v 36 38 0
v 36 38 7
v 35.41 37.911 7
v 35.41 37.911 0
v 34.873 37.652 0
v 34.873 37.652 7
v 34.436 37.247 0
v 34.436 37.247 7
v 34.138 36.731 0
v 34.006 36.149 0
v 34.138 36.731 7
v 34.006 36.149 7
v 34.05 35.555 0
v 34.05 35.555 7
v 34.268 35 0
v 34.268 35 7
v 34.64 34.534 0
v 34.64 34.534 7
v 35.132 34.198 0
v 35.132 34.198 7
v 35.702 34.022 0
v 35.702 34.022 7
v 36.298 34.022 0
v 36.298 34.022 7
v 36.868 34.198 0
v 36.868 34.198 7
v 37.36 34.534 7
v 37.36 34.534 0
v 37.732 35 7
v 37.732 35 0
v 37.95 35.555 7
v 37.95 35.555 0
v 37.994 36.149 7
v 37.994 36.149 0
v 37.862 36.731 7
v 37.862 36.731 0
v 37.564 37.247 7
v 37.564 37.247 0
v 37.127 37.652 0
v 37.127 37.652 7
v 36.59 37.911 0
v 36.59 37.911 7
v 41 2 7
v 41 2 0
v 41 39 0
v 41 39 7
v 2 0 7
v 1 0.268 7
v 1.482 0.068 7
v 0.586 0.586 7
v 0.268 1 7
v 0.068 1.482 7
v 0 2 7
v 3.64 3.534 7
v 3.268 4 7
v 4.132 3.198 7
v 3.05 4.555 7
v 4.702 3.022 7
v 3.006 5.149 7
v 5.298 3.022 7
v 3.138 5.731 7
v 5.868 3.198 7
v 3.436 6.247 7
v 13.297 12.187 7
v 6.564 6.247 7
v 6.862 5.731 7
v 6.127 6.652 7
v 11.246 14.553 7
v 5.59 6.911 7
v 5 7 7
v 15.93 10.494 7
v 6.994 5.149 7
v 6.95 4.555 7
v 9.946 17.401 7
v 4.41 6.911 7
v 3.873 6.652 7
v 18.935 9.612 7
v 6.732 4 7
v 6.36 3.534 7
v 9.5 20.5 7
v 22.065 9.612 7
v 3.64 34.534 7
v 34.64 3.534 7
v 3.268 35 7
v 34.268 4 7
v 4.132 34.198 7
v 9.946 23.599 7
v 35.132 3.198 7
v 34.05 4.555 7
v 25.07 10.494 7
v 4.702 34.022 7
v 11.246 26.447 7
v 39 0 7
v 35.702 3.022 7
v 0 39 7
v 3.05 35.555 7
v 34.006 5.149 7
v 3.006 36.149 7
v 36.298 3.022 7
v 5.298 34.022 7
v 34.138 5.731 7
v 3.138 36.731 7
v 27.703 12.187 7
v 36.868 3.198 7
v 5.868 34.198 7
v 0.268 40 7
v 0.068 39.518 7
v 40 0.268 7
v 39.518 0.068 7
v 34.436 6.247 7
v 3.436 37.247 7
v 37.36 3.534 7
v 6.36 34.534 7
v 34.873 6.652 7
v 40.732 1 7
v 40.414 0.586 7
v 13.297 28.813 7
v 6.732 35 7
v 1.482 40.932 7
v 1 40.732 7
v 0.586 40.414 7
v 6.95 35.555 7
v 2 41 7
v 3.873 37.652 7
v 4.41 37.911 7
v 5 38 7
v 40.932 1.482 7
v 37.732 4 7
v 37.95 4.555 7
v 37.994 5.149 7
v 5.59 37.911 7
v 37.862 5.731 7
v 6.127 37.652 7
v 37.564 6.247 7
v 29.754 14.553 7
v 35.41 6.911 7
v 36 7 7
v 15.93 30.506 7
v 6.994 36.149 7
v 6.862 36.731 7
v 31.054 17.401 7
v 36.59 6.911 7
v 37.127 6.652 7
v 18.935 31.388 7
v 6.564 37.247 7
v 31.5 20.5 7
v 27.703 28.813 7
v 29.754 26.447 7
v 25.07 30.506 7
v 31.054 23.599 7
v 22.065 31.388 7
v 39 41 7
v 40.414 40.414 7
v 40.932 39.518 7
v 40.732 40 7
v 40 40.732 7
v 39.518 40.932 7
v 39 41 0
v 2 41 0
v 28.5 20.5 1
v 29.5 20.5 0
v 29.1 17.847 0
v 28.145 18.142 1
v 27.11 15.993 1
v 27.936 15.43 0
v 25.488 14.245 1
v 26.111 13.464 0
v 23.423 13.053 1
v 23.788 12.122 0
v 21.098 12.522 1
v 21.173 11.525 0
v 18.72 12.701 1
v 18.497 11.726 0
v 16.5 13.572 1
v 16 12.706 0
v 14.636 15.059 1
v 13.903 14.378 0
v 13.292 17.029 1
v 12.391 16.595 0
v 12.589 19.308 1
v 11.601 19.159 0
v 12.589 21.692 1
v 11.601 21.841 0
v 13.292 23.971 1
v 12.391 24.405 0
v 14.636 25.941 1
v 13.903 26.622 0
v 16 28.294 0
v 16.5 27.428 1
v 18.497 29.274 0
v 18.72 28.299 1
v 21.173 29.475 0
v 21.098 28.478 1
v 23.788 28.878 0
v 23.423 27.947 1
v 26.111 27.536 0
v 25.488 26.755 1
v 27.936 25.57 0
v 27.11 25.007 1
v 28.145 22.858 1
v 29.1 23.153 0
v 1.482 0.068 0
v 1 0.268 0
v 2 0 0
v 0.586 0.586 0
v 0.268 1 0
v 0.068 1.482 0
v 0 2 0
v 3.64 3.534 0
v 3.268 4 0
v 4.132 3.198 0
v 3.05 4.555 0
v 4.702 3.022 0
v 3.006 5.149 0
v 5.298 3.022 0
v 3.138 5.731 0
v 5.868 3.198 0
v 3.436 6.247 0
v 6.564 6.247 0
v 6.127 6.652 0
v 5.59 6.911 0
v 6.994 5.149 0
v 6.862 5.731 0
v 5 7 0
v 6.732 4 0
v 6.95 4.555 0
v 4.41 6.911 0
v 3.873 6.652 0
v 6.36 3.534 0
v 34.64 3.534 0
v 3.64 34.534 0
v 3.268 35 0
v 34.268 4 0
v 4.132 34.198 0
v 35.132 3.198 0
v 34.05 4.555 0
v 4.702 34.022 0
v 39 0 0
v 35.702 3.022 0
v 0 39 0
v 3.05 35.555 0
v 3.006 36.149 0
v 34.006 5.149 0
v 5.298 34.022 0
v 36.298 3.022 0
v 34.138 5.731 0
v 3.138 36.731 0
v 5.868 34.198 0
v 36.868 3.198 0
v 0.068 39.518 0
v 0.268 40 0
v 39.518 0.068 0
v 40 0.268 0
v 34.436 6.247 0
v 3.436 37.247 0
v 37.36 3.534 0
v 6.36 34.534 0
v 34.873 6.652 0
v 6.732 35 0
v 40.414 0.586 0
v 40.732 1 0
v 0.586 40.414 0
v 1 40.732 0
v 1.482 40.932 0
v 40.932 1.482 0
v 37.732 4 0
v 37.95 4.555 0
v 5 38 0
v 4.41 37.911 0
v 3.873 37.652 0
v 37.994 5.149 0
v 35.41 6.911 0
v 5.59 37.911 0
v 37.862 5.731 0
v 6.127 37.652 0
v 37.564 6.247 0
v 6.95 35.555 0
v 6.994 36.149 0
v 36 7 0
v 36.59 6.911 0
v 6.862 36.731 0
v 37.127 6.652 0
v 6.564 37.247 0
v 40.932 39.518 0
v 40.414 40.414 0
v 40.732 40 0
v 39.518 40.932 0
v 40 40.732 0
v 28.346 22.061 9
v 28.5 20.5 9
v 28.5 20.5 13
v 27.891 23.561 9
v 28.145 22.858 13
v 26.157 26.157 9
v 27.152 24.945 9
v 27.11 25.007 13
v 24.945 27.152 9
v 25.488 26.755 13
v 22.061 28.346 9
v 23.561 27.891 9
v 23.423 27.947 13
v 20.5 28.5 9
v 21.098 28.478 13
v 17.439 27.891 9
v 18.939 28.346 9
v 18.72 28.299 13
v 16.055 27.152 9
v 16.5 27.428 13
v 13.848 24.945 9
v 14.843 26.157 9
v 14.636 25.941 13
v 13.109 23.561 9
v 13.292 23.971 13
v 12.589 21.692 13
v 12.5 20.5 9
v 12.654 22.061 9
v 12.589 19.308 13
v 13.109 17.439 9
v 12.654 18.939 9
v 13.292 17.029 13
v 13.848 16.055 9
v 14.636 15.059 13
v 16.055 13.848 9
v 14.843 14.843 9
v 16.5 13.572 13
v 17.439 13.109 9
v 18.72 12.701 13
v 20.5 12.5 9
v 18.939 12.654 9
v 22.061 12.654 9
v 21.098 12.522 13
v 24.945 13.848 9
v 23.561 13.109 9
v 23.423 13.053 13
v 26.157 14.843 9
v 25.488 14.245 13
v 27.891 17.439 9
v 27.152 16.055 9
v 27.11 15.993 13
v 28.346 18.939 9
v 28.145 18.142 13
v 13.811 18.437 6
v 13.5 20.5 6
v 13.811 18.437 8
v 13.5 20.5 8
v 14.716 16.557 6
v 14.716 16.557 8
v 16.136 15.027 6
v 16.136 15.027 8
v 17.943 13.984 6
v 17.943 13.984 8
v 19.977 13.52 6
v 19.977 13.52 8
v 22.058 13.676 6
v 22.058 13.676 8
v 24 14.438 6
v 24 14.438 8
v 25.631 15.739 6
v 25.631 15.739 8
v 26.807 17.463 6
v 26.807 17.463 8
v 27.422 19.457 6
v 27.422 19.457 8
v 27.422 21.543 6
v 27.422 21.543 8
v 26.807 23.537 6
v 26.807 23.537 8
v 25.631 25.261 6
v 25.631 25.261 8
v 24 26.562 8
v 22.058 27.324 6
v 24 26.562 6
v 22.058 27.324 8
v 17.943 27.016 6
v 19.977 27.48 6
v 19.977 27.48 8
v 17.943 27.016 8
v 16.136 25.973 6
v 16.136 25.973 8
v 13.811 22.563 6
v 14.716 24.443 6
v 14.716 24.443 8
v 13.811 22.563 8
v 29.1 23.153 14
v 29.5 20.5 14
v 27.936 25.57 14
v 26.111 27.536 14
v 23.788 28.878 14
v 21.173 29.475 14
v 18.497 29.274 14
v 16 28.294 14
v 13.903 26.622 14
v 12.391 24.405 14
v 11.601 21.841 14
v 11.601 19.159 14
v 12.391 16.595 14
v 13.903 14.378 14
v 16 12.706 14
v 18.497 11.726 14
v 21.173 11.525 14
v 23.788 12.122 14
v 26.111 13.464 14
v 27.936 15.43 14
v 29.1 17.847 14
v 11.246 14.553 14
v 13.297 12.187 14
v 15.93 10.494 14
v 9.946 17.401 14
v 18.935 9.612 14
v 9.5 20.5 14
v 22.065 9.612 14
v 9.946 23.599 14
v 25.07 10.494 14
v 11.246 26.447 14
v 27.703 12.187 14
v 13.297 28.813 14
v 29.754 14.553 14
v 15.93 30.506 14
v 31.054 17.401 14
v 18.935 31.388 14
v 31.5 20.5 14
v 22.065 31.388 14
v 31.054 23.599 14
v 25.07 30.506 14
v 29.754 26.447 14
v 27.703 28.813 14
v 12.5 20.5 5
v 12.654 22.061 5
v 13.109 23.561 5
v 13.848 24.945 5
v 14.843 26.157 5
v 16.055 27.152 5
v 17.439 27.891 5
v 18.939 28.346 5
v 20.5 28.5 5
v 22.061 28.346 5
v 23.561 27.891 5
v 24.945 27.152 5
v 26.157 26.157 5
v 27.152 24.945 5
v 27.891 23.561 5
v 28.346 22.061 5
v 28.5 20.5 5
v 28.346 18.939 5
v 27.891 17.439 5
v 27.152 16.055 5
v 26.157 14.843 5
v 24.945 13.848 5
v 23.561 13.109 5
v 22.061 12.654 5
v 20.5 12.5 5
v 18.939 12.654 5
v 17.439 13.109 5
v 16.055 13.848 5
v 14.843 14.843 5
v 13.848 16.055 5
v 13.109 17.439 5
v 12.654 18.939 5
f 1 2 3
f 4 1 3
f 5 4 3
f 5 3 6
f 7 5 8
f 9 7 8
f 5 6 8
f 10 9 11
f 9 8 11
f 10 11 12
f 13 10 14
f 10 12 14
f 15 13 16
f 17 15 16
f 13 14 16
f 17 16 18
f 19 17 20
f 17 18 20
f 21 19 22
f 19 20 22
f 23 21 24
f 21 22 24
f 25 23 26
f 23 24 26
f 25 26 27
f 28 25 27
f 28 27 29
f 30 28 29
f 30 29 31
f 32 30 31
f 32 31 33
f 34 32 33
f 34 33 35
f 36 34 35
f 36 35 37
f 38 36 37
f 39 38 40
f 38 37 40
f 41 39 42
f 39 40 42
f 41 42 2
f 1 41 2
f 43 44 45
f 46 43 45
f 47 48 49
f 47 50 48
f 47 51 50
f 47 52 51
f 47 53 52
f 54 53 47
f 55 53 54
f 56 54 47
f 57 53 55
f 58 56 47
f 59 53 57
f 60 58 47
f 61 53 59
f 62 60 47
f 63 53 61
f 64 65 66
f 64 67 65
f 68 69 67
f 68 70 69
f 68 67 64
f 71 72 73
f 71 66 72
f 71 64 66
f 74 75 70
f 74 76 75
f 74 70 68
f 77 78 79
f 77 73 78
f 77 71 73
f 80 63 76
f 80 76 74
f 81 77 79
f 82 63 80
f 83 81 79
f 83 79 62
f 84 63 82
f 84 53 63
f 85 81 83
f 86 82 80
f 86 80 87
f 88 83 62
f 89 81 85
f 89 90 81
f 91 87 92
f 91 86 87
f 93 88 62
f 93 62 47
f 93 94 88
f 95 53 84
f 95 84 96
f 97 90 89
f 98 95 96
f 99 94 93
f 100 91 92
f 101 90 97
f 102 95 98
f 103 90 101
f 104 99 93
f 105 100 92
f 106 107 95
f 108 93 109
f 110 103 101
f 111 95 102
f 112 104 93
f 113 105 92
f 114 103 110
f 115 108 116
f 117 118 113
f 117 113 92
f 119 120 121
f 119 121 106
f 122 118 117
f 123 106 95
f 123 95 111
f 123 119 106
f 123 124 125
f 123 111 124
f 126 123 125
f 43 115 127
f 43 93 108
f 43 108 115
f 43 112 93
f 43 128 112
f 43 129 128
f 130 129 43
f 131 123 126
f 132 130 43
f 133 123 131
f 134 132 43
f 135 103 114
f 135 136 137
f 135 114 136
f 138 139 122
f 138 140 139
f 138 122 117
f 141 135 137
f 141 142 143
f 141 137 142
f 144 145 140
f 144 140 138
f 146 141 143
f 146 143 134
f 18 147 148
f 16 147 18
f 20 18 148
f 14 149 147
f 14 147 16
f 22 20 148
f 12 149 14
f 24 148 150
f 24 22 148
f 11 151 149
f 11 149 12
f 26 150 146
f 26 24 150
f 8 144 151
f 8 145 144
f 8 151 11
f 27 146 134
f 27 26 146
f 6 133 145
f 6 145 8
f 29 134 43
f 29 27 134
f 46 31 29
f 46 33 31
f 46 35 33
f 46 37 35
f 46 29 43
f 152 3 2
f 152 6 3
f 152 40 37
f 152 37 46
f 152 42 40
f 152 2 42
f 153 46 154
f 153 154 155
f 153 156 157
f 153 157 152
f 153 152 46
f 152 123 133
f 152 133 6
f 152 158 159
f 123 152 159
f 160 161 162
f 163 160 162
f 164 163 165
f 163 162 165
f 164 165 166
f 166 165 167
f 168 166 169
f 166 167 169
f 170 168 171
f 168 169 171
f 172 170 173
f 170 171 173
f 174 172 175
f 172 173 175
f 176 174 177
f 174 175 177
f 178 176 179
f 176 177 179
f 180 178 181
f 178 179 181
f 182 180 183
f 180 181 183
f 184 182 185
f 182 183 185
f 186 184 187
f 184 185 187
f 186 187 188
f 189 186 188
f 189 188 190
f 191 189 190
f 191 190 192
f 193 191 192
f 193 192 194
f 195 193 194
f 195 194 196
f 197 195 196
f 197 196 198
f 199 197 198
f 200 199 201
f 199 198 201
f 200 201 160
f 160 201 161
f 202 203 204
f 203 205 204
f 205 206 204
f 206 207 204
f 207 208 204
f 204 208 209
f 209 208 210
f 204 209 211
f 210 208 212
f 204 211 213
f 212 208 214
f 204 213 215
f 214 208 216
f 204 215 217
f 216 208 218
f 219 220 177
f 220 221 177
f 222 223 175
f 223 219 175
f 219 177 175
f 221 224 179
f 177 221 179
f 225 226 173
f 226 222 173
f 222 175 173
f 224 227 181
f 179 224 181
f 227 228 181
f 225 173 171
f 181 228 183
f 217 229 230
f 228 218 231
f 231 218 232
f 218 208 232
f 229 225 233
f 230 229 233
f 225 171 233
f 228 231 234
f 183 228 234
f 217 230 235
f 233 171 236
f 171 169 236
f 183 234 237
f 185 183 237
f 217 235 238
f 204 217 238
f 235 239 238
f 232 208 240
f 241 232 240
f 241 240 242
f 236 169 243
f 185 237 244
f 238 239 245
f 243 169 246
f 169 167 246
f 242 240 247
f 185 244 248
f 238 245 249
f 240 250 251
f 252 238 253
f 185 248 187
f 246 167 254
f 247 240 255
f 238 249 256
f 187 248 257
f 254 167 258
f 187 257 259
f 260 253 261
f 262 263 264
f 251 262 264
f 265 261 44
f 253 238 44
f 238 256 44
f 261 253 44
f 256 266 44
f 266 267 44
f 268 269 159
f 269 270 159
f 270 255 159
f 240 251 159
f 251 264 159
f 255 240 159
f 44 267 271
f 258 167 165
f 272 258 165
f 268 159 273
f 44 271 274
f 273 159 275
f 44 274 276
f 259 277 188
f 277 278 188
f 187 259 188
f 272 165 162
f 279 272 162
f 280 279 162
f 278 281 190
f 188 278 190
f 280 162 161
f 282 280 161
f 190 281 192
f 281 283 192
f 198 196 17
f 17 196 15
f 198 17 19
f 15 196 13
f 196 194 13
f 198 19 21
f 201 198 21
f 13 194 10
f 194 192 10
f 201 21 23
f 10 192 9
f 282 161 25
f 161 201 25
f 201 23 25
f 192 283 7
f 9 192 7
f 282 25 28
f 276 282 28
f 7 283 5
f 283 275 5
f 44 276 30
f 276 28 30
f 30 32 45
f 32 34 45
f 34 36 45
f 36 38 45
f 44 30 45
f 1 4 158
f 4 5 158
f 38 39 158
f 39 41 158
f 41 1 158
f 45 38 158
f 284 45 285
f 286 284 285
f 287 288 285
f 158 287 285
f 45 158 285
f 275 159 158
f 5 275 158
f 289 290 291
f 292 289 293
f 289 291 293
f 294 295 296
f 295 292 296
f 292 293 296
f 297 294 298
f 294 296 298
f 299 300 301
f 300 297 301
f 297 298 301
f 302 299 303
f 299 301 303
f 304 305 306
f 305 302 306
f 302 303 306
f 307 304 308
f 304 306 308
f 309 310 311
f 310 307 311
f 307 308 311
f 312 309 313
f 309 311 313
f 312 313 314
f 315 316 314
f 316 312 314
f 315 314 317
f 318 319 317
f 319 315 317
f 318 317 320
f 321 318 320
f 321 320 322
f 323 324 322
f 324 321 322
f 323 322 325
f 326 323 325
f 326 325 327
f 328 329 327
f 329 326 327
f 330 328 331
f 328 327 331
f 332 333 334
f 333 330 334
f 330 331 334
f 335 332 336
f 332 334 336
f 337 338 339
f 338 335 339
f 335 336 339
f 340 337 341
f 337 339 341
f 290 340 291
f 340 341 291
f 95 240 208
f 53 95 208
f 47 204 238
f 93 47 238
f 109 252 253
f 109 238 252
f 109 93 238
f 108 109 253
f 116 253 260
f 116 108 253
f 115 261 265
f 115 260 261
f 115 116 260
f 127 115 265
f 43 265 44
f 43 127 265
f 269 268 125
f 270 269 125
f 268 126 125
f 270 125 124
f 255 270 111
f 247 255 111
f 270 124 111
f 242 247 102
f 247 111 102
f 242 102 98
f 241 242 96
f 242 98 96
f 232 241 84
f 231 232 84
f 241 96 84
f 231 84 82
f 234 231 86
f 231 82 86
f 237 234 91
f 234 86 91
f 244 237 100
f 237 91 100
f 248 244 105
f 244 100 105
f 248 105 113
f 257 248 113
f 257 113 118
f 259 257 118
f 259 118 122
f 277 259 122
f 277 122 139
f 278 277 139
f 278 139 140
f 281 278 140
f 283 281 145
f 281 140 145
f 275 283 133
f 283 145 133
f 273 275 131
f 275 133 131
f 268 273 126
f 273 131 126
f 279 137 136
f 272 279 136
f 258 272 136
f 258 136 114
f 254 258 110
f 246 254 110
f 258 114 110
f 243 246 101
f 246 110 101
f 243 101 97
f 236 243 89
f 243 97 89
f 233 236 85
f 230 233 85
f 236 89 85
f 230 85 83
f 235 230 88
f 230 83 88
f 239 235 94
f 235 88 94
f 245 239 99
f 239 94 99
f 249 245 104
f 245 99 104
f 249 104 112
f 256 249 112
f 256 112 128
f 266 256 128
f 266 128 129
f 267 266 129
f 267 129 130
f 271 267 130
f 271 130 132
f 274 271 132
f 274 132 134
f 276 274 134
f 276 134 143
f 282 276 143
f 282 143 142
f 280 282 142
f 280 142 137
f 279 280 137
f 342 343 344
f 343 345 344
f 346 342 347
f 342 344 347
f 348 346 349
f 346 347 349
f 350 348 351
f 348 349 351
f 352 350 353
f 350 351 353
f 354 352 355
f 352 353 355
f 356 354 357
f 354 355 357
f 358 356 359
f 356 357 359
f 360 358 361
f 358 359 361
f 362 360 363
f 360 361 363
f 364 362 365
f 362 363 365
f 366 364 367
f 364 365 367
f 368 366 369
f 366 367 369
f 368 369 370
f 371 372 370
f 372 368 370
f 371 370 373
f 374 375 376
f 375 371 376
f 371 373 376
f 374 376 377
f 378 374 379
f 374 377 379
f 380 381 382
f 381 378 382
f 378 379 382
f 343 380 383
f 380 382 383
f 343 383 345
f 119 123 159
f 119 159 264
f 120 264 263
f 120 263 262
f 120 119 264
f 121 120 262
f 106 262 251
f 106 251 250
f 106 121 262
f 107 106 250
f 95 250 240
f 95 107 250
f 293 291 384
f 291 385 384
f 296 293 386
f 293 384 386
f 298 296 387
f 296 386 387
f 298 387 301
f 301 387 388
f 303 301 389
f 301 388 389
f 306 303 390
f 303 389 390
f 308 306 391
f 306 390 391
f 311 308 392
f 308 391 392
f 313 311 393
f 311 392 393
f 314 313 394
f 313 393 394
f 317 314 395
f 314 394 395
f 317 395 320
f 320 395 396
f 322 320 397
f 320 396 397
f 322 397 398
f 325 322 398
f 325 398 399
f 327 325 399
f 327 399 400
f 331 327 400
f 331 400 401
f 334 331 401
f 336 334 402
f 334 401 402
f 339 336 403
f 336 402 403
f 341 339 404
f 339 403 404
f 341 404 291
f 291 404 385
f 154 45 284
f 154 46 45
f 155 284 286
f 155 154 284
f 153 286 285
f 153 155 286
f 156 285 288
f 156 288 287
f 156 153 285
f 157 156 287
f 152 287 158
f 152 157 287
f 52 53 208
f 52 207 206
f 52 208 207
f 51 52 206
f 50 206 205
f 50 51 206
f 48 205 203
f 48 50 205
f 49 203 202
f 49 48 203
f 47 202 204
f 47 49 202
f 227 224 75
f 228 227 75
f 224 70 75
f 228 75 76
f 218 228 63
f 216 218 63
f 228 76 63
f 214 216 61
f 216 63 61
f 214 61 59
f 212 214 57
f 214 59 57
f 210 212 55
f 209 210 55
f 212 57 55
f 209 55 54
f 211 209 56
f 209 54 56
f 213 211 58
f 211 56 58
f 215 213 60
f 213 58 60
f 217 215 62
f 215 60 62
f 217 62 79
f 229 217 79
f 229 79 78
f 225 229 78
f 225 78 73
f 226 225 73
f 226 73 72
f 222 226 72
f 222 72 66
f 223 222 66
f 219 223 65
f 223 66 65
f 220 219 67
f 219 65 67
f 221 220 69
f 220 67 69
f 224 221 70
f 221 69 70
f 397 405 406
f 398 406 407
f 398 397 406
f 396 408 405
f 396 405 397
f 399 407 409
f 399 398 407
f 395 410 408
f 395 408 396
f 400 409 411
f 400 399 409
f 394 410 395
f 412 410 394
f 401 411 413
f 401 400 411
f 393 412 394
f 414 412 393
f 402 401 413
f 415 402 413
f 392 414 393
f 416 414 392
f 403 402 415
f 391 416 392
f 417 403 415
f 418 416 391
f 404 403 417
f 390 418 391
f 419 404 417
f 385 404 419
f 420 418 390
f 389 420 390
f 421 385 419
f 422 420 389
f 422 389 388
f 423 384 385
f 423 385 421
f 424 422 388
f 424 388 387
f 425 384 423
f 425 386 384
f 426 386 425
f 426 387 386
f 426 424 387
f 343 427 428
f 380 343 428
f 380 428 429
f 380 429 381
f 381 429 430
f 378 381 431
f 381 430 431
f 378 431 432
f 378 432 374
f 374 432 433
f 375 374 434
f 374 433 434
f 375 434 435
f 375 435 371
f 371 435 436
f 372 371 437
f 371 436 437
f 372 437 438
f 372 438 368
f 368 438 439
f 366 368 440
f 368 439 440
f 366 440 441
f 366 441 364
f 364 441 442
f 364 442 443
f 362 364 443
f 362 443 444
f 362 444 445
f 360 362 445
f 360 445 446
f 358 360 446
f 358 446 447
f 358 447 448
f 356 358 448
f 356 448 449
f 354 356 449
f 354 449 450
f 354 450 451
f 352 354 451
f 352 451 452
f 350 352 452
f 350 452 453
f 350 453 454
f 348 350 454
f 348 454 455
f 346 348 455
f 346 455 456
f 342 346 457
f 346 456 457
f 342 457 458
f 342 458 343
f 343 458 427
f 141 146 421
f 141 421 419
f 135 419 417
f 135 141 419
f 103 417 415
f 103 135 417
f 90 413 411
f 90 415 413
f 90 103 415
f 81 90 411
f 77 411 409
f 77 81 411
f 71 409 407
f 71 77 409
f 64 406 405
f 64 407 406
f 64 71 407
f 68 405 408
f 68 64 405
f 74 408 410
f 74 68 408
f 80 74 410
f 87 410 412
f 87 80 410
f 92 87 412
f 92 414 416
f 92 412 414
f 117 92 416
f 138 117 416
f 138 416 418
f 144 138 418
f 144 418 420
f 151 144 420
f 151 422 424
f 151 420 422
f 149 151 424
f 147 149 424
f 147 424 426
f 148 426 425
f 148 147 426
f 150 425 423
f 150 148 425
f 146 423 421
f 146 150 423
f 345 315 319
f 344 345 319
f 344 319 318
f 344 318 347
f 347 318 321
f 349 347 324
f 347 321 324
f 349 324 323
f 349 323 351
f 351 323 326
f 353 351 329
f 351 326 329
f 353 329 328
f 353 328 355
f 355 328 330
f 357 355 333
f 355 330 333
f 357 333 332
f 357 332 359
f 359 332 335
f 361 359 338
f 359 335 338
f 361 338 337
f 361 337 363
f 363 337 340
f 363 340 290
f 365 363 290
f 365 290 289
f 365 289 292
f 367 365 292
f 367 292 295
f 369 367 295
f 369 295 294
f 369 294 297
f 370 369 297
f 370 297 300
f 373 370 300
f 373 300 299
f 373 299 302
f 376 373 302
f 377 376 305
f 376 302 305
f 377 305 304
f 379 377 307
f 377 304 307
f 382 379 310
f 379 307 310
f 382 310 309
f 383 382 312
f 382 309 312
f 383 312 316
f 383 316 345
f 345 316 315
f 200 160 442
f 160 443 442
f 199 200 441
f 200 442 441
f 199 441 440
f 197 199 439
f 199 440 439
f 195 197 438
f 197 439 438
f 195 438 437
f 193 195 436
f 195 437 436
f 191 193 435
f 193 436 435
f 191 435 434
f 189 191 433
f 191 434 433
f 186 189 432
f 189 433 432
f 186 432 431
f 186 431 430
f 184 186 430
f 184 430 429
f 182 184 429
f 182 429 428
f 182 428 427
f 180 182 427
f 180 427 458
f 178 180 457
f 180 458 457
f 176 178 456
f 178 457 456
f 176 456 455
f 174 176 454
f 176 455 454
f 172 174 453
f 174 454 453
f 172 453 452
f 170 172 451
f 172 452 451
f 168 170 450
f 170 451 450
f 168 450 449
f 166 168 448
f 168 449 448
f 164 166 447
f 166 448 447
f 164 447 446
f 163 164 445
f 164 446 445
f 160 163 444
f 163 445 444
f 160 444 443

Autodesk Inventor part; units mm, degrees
ref_plane "YZ Plane" through (0, 0, 0) normal (1, 0, 0) x (0, 1, 0)
ref_plane "XZ Plane" through (0, 0, 0) normal (0, 1, 0) x (-1, 0, 0)
sketch "Sketch1" plane through (0, 0, 0) normal (0, 0, 1) x (1, 0, 0)
  line L0 (5, 36) -> (36, 36) construction
  line L1 (36, 36) -> (36, 5) construction
  line L2 (36, 5) -> (5, 5) construction
  line L3 (5, 5) -> (5, 36) construction
  line L4 (41, 41) -> (0, 41)
  line L5 (0, 41) -> (0, 0)
  line L6 (0, 0) -> (41, 0)
  line L7 (41, 0) -> (41, 41)
  dimension "d0" = 31
  dimension "d1" = 5
extrude "Extrusion1" add sketch "Sketch1" along normal blind 7
hole "Hole1" at (5, 36, 0) at (36, 36, 0) at (36, 5, 0) at (5, 5, 0) direction (0, 0, 1) diameter 4 end through all
sketch "Sketch2" plane through (0, 0, 7) normal (0, 0, 1) x (1, 0, 0)
  circle A0 centre (20.5, 20.5) radius 11
  circle A1 centre (20.5, 20.5) radius 8 construction
  line L0 (41, 0) -> (41, 41) projected
  line L1 (41, 41) -> (0, 41) projected
  point P0 (0, 0)
  point P1 (41, 20.5)
  point P2 (20.5, 41)
  dimension "d11" = 22
  dimension "d12" = 16
extrude "Extrusion2" add sketch "Sketch2" along normal blind 7
sketch "Sketch3" plane through (20.5, 20.5, 14) normal (0, 0, 1) x (1, 0, 0)
  circle A0 centre (0, 0) radius 11 projected
  circle A1 centre (0, 0) radius 8
  point P0 (-20.5, -20.5)
  dimension "d15" = 16
extrude "Extrusion3" cut sketch "Sketch3" against normal through all contours A1
ref_plane "Work Plane1" through (0, 0, 7) normal (0, 0, -1) x (-1, 0, 0)
sketch "Sketch4" plane through (0, 0, 7) normal (0, 0, -1) x (-1, 0, 0)
  circle A0 centre (-20.5, 20.5) radius 8 projected
  circle A1 centre (-20.5, 20.5) radius 11 projected
  circle A2 centre (-20.5, 20.5) radius 7
  point P0 (0, 0)
  dimension "d18" = 1
extrude "Extrusion4" add sketch "Sketch4" along normal mid plane 4 contours A0
chamfer "Chamfer1" distance 1 angle 45 2 edges at (27.5, 20.5, 9) (27.5, 20.5, 5)
fillet "Fillet1" radius 2 4 edges at (0, 41, 3.5) (0, 0, 3.5) (41, 0, 3.5) (41, 41, 3.5)
chamfer "Chamfer2" distance 1 angle 45 2 edges at (12.5, 20.5, 0) (12.5, 20.5, 14)
properties part number "Motor to Bearing Adapter"
